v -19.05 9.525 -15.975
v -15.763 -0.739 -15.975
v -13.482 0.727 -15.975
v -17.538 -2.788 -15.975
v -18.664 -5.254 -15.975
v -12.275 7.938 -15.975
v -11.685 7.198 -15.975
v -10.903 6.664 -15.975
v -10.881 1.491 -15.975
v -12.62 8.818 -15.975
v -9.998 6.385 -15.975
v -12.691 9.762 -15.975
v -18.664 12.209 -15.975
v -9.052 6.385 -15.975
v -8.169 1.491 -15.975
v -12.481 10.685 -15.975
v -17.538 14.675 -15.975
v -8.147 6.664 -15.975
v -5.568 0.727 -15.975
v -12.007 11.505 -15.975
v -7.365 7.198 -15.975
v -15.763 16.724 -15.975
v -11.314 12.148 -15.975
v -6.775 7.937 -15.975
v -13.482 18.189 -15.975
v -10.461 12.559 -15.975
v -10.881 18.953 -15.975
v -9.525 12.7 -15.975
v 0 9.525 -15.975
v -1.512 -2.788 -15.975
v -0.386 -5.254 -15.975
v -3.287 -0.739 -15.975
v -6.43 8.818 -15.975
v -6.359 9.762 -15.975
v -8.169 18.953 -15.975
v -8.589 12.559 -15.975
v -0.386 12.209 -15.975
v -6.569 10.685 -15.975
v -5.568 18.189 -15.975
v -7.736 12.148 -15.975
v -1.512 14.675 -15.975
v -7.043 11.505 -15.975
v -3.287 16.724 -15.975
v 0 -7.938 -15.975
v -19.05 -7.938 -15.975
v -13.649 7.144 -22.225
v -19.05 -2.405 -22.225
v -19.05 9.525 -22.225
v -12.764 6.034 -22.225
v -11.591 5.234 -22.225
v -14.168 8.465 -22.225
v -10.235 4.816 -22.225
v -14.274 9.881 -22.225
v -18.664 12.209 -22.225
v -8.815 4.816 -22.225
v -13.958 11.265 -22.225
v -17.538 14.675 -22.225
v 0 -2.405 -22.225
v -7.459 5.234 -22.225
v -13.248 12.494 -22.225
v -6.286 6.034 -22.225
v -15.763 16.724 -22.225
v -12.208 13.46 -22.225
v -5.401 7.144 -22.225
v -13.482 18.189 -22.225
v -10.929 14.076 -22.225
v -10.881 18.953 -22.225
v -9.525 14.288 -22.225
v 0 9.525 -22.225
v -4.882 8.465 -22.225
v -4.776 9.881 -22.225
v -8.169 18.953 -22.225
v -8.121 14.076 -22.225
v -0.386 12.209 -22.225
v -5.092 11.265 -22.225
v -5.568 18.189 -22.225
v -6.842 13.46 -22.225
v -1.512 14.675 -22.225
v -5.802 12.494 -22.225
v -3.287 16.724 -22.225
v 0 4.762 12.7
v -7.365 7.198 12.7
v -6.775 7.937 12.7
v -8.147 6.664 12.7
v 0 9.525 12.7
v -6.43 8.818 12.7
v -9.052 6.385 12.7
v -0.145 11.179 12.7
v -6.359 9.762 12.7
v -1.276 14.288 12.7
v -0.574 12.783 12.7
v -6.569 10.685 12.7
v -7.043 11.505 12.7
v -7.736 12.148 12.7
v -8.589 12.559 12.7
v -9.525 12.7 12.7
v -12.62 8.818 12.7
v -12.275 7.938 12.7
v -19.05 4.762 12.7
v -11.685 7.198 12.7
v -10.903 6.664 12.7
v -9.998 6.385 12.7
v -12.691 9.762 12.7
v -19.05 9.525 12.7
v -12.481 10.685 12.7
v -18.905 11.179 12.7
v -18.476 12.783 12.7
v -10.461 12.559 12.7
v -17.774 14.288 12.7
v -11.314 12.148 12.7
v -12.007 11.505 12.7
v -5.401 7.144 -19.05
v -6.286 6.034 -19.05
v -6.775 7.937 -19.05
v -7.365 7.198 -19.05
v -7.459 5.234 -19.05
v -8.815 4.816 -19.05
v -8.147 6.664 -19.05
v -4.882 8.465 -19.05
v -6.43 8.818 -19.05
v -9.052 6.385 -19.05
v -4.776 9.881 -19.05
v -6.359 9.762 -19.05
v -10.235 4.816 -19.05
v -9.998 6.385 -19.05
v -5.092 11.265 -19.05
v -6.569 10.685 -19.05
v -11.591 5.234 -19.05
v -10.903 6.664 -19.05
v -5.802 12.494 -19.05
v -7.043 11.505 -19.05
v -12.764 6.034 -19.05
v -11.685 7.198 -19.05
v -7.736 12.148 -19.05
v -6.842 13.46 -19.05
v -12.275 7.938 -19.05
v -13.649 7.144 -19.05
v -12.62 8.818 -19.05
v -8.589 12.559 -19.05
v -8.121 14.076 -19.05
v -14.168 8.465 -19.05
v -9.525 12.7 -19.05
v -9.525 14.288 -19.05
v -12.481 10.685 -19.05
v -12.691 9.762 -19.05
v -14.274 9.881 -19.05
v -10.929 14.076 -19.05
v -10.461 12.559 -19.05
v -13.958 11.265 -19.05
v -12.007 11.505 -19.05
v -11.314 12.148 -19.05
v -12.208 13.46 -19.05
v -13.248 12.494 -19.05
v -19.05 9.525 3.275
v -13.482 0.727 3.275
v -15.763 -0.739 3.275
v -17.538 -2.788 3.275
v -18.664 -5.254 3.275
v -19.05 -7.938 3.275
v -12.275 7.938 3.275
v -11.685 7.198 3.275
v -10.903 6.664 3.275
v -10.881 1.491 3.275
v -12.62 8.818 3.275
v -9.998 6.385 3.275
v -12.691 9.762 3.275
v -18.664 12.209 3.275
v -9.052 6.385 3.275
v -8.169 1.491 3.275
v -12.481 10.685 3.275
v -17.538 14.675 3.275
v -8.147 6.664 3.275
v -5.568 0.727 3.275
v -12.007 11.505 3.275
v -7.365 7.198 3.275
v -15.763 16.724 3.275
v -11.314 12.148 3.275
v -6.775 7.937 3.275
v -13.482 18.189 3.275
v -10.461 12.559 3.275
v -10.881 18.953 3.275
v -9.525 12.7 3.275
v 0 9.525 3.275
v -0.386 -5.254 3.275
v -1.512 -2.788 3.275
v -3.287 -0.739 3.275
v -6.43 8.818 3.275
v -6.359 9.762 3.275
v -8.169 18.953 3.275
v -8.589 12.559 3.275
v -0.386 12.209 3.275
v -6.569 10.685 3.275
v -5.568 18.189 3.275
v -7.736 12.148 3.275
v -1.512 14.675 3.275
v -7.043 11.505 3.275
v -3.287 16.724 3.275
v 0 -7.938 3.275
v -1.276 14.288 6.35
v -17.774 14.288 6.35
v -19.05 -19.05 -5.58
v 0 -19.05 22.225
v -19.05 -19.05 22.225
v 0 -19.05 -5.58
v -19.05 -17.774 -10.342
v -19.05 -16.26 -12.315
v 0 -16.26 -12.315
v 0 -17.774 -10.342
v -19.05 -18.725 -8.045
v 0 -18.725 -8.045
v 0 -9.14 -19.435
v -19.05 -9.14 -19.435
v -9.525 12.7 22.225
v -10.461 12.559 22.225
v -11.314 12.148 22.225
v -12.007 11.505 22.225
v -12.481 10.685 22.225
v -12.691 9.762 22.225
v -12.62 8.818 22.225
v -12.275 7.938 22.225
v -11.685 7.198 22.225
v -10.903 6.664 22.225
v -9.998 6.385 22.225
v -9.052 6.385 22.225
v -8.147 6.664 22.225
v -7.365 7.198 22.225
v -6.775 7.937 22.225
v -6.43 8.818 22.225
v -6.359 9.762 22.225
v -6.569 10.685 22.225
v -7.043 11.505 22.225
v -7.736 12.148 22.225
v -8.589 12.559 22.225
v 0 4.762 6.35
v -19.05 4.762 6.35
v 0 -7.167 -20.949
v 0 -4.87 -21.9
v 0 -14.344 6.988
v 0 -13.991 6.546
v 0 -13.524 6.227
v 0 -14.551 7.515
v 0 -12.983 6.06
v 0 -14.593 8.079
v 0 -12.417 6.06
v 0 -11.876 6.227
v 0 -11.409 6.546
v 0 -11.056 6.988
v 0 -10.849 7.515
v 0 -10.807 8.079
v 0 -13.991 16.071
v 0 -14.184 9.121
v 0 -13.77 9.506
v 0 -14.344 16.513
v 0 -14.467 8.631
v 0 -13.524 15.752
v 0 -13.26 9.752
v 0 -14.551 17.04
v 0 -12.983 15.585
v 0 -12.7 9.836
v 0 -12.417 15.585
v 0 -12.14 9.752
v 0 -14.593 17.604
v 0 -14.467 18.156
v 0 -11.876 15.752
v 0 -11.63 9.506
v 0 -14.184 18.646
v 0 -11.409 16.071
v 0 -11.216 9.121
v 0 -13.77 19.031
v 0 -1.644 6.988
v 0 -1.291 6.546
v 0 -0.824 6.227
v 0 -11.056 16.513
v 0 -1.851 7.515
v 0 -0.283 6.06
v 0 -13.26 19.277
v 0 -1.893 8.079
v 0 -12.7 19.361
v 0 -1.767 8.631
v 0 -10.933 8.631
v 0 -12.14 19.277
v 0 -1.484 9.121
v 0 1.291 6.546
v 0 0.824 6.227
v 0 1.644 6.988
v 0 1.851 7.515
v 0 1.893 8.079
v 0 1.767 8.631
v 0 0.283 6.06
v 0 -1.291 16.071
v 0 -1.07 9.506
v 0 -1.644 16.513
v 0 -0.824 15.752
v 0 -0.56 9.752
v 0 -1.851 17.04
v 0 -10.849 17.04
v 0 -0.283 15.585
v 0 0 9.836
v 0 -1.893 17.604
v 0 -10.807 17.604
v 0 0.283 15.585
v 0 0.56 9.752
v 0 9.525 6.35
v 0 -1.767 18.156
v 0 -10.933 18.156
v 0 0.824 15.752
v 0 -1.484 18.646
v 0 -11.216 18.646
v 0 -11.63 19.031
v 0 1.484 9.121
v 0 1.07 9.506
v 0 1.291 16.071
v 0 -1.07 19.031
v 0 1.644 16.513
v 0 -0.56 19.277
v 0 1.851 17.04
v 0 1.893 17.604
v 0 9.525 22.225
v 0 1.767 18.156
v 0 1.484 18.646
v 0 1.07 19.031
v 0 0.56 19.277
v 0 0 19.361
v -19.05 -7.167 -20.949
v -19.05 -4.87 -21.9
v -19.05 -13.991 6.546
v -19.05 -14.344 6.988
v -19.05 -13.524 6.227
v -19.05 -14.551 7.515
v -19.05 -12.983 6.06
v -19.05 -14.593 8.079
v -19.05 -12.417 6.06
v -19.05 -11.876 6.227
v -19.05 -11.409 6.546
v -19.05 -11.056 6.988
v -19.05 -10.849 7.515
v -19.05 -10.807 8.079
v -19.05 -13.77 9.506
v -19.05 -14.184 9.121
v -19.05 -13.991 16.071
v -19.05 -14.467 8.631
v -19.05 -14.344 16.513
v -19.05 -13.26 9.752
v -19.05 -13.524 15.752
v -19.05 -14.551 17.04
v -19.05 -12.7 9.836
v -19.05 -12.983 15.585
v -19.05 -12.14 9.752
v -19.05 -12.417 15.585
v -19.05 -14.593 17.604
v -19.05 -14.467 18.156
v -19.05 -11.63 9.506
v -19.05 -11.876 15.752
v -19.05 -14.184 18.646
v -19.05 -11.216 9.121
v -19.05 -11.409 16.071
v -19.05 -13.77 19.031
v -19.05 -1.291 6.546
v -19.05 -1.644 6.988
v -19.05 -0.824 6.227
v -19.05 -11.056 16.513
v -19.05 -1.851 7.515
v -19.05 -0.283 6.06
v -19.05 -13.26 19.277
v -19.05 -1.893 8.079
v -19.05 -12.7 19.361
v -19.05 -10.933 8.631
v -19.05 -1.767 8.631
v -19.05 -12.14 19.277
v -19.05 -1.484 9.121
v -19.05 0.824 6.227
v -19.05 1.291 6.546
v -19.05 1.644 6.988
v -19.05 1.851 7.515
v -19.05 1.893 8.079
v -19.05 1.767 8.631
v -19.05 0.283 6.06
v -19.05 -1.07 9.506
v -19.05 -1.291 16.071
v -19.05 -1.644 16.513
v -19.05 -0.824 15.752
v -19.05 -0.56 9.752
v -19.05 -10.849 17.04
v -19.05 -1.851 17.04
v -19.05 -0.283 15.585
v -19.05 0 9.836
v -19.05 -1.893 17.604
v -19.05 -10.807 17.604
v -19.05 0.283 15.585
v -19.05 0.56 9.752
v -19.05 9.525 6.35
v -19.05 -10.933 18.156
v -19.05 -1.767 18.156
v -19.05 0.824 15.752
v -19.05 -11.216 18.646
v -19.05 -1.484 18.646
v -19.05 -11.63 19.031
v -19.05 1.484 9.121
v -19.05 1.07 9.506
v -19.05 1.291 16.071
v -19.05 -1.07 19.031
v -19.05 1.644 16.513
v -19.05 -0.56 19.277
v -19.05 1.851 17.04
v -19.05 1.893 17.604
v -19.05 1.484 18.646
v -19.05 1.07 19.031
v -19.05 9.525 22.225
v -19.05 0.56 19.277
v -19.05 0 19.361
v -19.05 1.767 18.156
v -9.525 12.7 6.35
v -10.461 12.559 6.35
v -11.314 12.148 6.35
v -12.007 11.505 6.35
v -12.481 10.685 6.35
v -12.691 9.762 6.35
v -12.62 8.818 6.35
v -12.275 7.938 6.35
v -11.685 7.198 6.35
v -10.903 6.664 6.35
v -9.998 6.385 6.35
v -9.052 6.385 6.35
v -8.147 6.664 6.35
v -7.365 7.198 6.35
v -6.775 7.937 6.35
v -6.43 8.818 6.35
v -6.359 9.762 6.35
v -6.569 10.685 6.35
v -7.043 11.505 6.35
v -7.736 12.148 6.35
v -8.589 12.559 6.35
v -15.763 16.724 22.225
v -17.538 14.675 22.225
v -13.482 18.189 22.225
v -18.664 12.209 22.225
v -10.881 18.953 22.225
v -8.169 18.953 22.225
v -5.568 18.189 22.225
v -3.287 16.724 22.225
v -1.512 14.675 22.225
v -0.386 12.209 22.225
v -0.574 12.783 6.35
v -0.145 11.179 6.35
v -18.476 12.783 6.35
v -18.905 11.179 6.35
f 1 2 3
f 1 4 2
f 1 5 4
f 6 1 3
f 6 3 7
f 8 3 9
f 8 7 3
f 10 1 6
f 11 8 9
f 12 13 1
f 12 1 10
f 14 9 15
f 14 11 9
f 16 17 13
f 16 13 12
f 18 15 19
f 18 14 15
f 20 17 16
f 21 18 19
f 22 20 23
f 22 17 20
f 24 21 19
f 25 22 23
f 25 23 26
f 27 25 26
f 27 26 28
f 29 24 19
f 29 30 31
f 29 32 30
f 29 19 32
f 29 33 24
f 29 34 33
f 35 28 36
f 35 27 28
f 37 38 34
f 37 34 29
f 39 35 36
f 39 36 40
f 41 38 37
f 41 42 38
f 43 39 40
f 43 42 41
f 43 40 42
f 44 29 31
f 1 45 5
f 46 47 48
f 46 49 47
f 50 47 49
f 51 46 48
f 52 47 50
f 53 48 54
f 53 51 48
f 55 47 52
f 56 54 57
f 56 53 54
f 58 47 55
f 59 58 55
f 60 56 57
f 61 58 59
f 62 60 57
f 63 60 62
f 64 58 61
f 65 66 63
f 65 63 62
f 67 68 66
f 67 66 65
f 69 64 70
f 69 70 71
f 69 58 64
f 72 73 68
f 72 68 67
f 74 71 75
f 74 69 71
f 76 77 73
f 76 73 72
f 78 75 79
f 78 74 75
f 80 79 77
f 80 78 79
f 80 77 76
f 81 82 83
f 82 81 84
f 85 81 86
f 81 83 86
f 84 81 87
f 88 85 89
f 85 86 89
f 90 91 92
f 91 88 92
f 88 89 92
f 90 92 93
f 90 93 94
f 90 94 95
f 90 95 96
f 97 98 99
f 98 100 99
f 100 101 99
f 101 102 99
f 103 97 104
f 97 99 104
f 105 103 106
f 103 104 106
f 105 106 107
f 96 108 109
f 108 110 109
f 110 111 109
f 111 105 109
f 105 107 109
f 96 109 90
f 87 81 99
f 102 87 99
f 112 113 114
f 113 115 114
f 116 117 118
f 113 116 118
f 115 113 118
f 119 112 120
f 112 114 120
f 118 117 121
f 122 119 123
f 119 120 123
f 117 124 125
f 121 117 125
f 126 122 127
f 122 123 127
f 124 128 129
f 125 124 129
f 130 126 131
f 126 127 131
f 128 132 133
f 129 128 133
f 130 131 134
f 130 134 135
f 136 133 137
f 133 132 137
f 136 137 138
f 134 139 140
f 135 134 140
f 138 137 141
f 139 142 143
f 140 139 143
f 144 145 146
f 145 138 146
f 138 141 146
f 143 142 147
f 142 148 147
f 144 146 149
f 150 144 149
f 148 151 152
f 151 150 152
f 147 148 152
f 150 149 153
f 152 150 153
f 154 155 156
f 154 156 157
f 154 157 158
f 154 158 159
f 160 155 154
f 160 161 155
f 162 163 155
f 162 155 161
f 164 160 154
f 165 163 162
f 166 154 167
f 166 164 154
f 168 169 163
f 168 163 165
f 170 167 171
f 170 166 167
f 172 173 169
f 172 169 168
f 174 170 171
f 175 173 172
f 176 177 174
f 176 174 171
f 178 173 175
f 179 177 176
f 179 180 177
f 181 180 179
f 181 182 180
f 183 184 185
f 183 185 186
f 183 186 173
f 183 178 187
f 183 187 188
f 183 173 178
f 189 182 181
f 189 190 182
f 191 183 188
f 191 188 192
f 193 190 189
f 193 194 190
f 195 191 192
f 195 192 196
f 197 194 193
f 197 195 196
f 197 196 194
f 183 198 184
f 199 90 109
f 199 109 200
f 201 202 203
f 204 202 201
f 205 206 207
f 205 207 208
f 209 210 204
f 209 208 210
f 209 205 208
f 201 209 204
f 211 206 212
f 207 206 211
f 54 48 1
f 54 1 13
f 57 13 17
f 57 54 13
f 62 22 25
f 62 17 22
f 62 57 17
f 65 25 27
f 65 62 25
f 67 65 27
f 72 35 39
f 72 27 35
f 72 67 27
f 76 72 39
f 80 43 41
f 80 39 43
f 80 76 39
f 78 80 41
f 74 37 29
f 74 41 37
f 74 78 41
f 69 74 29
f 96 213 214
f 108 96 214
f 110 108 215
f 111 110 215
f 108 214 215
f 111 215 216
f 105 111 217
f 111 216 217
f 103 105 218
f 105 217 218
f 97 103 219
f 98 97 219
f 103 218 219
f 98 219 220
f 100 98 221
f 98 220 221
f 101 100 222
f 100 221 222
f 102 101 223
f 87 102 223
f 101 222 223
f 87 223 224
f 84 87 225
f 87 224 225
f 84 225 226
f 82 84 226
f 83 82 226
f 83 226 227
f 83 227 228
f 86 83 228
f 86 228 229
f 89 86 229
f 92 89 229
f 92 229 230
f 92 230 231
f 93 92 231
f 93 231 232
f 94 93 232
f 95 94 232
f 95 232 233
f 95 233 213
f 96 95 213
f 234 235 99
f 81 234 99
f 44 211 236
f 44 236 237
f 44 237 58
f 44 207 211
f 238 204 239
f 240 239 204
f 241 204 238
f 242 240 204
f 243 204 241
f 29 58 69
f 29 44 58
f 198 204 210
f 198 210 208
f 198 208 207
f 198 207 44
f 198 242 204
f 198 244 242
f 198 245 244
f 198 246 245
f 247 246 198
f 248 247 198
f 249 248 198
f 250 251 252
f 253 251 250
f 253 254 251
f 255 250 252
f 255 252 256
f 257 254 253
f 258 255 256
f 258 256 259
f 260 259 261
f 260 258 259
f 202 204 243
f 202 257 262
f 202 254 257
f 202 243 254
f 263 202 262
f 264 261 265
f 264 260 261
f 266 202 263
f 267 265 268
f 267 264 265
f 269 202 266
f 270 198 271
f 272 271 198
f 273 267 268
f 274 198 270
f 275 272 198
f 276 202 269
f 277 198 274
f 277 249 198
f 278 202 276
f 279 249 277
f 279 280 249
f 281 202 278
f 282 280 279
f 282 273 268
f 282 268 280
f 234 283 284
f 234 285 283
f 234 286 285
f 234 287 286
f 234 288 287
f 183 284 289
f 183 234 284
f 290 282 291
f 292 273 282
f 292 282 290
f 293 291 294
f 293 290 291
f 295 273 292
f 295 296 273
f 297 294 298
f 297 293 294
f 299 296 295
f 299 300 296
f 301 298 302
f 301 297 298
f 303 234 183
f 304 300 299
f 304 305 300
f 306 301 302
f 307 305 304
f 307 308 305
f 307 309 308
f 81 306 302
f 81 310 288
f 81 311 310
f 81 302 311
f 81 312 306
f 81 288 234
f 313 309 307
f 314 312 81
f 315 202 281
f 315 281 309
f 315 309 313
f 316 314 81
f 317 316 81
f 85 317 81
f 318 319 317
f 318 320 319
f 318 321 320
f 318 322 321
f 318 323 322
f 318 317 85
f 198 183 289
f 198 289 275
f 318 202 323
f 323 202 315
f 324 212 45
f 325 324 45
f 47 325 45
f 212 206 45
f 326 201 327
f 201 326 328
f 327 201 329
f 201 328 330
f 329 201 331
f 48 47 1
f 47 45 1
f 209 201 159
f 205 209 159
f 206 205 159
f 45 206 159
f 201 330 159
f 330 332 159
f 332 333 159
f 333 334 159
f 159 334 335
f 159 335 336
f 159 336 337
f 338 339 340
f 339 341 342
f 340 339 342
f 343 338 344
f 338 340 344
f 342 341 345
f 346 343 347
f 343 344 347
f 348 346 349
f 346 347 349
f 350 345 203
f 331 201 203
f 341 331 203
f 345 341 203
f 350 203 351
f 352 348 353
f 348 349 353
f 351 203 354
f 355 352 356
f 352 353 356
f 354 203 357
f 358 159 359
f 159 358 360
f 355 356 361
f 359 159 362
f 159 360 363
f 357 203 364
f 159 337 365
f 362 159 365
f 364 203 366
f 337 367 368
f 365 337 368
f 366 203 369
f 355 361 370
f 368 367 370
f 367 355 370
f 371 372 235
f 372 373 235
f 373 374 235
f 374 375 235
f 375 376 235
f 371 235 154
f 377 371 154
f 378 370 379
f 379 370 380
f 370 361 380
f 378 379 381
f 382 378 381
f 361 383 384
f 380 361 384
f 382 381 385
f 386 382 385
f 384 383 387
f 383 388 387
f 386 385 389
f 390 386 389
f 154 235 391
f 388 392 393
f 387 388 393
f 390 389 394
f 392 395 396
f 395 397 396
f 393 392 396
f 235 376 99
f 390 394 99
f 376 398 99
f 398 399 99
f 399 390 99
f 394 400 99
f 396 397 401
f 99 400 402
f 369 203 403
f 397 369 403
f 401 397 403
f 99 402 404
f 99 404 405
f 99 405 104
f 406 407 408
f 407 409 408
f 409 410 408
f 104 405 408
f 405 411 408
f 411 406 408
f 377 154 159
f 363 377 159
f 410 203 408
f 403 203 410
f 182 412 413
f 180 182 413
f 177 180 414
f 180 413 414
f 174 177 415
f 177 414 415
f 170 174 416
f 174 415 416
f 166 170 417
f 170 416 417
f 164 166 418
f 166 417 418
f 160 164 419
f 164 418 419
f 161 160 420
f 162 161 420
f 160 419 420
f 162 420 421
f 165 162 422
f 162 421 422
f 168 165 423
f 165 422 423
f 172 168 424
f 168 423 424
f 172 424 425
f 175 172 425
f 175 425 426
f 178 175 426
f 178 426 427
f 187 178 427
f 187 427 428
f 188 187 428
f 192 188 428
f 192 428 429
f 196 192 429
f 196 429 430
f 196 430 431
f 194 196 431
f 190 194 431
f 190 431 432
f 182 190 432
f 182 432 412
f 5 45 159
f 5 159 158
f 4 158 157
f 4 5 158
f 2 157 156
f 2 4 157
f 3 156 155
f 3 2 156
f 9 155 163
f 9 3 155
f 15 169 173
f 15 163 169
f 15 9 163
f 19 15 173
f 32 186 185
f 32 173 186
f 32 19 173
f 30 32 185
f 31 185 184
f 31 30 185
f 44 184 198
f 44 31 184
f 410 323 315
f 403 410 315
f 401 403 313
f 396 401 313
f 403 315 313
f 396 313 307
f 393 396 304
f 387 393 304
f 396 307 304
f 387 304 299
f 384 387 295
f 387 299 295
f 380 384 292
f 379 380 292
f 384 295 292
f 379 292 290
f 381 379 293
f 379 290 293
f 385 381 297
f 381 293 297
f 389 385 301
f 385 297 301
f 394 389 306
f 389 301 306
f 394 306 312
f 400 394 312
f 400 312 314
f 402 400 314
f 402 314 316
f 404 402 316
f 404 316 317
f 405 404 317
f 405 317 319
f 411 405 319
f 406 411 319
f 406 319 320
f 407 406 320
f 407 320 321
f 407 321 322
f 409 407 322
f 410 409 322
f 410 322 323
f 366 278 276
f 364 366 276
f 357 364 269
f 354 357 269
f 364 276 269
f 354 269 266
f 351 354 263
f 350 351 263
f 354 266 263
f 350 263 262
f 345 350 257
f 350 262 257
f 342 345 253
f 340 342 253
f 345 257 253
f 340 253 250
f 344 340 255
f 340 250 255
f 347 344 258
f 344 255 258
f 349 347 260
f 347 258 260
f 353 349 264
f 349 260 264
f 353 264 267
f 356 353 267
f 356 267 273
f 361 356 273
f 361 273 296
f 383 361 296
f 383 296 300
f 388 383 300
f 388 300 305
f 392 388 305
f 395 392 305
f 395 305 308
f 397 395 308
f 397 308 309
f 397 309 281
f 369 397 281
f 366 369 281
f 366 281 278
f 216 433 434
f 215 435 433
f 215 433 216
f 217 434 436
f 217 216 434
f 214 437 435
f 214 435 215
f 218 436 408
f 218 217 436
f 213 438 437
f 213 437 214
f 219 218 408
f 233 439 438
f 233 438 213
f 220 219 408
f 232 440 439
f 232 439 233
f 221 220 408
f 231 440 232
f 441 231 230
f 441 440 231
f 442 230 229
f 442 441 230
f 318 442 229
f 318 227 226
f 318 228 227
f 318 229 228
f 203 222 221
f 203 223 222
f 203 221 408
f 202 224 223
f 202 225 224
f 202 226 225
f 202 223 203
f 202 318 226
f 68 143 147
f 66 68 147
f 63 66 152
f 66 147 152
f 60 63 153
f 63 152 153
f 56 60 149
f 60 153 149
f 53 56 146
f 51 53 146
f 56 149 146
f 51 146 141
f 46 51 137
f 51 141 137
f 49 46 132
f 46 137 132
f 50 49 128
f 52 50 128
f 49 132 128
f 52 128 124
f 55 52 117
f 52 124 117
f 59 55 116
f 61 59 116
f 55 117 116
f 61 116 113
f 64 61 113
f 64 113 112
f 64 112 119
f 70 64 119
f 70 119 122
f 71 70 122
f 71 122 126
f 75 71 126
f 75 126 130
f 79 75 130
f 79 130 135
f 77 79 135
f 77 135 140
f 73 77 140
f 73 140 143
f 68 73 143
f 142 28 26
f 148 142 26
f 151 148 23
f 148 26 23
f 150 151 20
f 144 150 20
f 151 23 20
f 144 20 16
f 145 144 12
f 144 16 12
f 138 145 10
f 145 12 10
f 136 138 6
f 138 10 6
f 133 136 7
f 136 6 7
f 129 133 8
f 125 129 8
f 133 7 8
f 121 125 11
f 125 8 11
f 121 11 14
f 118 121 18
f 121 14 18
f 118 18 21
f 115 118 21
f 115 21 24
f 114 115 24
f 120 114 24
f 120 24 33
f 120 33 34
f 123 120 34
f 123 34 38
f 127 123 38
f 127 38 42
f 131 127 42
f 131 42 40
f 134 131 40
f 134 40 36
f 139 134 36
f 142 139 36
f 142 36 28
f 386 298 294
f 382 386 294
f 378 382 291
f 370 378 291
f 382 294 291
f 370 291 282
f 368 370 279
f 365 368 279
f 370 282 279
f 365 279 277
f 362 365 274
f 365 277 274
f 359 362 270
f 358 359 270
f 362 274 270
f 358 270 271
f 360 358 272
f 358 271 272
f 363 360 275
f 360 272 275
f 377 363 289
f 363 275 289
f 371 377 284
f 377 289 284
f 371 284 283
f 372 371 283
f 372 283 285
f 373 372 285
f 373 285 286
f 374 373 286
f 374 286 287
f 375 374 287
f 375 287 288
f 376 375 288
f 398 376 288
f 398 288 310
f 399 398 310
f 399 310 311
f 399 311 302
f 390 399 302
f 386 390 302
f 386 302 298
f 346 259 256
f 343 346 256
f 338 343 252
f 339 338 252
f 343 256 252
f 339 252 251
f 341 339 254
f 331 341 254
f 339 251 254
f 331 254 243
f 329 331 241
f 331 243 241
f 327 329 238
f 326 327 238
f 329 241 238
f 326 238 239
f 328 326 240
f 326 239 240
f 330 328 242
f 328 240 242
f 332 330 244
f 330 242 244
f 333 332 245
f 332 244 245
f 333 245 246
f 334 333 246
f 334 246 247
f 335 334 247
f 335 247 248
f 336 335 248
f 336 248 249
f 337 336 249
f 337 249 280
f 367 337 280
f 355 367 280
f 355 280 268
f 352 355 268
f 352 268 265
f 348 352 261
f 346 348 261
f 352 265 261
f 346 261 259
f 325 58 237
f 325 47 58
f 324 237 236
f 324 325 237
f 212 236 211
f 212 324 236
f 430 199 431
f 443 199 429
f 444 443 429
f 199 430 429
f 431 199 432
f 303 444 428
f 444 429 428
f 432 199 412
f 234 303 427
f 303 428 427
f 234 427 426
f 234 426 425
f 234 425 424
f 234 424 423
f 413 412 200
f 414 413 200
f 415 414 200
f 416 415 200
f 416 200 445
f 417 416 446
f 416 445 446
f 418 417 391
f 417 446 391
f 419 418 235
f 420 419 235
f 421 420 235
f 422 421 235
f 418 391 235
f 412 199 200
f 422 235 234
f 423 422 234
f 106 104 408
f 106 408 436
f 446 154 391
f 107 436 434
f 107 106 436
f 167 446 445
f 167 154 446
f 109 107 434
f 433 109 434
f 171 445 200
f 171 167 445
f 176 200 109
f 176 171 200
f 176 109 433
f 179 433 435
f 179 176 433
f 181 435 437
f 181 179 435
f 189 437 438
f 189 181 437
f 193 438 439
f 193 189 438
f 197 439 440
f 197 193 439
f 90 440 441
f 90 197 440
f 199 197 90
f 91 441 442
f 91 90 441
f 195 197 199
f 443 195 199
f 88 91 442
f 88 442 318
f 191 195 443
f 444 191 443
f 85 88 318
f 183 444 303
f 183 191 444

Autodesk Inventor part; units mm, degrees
ref_plane "YZ Plane" through (0, 0, 0) normal (1, 0, 0) x (0, 1, 0)
ref_plane "XZ Plane" through (0, 0, 0) normal (0, 1, 0) x (-1, 0, 0)
ref_plane "XY Plane" through (0, 0, 0) normal (0, 0, 1) x (1, 0, 0)
sketch "Sketch1" plane through (0, 0, 0) normal (1, 0, 0) x (0, 1, 0)
  line L0 (19.05, 22.225) -> (-19.05, 22.225)
  line L1 (-19.05, 22.225) -> (-19.05, -22.225)
  line L2 (-19.05, -22.225) -> (19.05, -22.225)
  line L3 (19.05, -22.225) -> (19.05, 22.225)
  line L4 (19.05, 22.225) -> (-19.05, -22.225) construction
  line L5 (-19.05, 22.225) -> (19.05, -22.225) construction
  line L6 (19.05, -15.875) -> (1.5875, -15.875)
  line L7 (1.5875, -15.875) -> (1.5875, 3.175)
  line L8 (1.5875, 3.175) -> (19.05, 3.175)
  line L9 (19.05, 3.175) -> (19.05, -15.875)
  line L10 (-19.05, 17.4625) -> (19.05, 17.4625) construction
  point P0 (0, 0)
  point P1 (-12.7, 17.4625)
  point P2 (0, 17.4625)
  point P3 (-12.7, 7.9375)
  point P4 (0, 7.9375)
  dimension "d0" = 38.1
  dimension "d1" = 44.45
  dimension "d2" = 17.4625
  dimension "d3" = 19.05
  dimension "d4" = 6.35
  dimension "d31" = 4.7625
  dimension "d32" = 6.35
  dimension "d35" = 12.7
  dimension "d38" = 9.525
extrude "Extrusion1" add sketch "Sketch1" against normal blind 19.05 contours L3 L8 L7 L6 L2 L1 L0
sketch "Sketch2" plane through (0, -19.05, -22.225) normal (0, 0, -1) x (-1, 0, 0)
  line L0 (0, 38.1) -> (19.05, 38.1) projected
  line L1 (0, 0) -> (0, 38.1) projected
  point P0 (0, 19.05)
  point P1 (9.525, 28.575)
  dimension "d7" = 9.525
  dimension "d8" = 9.525
hole "Hole1" at (-9.525, 9.525, -22.225) direction (0, 0, 1) diameter 6.35 end through all counterbore diameter 9.525 counterbore depth 3.175
sketch "Sketch3" plane through (-19.05, 0, 0) normal (-1, 0, 0) x (0, 0, 1)
  line L0 (3.175, 6.35) -> (3.175, 12.7) projected
  line L1 (22.225, 12.7) -> (22.225, 6.35) projected
  line L2 (3.175, 6.35) -> (3.175, 12.7) projected
  line L3 (3.175, 19.05) -> (3.175, 1.5875) projected
  line L4 (3.175, 9.525) -> (22.225, 9.525) construction
  line L5 (22.225, -19.05) -> (22.225, 19.05) projected
  line L6 (22.225, 19.05) -> (3.175, 19.05) projected
  line L7 (12.7, 14.2875) -> (6.35, 14.2875)
  line L8 (6.35, 14.2875) -> (6.35, 4.7625)
  line L9 (6.35, 4.7625) -> (12.7, 4.7625)
  line L10 (12.7, 4.7625) -> (12.7, 14.2875)
  line L11 (12.7, 14.2875) -> (6.35, 4.7625) construction
  line L12 (6.35, 14.2875) -> (12.7, 4.7625) construction
  point P0 (0, 0)
  point P1 (9.525, 9.525)
  dimension "d16" = 9.525
  dimension "d17" = 6.35
  dimension "d18" = 9.525
  dimension "d19" = 3.175
extrude "Extrusion2" cut sketch "Sketch3" against normal through all
fillet "Fillet1" radius 9.525 6 edges at (0, 19.05, 12.7) (0, 19.05, -19.05) (-19.05, 19.05, -19.05) (-19.05, 19.05, 12.7) (-19.05, 1.5875, -6.35) (0, 1.5875, -6.35)
chamfer "Chamfer1" distance 12.7 angle 45 1 edges at (-9.525, -19.05, -22.225)
fillet "Fillet2" radius 9.525 2 edges at (-9.525, -6.35, -22.225) (-9.525, -19.05, -9.525)
thicken "Thicken1" operation add thickness 0.1 both sides no extend neighbours yes toward (0, 0, 1) faces at (-3.6754, 5.7159, 3.175)
thicken "Thicken2" operation add thickness 0.1 both sides no extend neighbours yes toward (0, 0, -1) faces at (-3.6754, 5.7159, -15.875)
hole "Hole2" at (0, -12.7, 17.4625) at (0, 0, 17.4625) at (0, -12.7, 7.9375) at (0, 0, 7.9375) direction (-1, 0, 0) diameter 3.175 end through all
sketch "Sketch4" plane through (-19.05, 0, 0) normal (-1, 0, 0) x (0, 0, 1)
  point P0 (17.4625, 0)
  point P1 (7.9375, 0)
  point P2 (7.9375, -12.7)
  point P3 (17.4625, -12.7)
  point P4 (93.6625, -12.7)
  point P5 (84.1375, -12.7)
  point P6 (84.1375, 0)
  point P7 (93.6625, 0)
hole "Hole3" at (-19.05, 0, 17.4625) at (-19.05, 0, 7.9375) at (-19.05, -12.7, 7.9375) at (-19.05, -12.7, 17.4625) at (-19.05, -12.7, 93.6625) at (-19.05, -12.7, 84.1375) at (-19.05, 0, 84.1375) at (-19.05, 0, 93.6625) direction (1, 0, 0) diameter 3.7973 depth 19.05
properties part number "Side Mounts" material "Nylon 6/6"
